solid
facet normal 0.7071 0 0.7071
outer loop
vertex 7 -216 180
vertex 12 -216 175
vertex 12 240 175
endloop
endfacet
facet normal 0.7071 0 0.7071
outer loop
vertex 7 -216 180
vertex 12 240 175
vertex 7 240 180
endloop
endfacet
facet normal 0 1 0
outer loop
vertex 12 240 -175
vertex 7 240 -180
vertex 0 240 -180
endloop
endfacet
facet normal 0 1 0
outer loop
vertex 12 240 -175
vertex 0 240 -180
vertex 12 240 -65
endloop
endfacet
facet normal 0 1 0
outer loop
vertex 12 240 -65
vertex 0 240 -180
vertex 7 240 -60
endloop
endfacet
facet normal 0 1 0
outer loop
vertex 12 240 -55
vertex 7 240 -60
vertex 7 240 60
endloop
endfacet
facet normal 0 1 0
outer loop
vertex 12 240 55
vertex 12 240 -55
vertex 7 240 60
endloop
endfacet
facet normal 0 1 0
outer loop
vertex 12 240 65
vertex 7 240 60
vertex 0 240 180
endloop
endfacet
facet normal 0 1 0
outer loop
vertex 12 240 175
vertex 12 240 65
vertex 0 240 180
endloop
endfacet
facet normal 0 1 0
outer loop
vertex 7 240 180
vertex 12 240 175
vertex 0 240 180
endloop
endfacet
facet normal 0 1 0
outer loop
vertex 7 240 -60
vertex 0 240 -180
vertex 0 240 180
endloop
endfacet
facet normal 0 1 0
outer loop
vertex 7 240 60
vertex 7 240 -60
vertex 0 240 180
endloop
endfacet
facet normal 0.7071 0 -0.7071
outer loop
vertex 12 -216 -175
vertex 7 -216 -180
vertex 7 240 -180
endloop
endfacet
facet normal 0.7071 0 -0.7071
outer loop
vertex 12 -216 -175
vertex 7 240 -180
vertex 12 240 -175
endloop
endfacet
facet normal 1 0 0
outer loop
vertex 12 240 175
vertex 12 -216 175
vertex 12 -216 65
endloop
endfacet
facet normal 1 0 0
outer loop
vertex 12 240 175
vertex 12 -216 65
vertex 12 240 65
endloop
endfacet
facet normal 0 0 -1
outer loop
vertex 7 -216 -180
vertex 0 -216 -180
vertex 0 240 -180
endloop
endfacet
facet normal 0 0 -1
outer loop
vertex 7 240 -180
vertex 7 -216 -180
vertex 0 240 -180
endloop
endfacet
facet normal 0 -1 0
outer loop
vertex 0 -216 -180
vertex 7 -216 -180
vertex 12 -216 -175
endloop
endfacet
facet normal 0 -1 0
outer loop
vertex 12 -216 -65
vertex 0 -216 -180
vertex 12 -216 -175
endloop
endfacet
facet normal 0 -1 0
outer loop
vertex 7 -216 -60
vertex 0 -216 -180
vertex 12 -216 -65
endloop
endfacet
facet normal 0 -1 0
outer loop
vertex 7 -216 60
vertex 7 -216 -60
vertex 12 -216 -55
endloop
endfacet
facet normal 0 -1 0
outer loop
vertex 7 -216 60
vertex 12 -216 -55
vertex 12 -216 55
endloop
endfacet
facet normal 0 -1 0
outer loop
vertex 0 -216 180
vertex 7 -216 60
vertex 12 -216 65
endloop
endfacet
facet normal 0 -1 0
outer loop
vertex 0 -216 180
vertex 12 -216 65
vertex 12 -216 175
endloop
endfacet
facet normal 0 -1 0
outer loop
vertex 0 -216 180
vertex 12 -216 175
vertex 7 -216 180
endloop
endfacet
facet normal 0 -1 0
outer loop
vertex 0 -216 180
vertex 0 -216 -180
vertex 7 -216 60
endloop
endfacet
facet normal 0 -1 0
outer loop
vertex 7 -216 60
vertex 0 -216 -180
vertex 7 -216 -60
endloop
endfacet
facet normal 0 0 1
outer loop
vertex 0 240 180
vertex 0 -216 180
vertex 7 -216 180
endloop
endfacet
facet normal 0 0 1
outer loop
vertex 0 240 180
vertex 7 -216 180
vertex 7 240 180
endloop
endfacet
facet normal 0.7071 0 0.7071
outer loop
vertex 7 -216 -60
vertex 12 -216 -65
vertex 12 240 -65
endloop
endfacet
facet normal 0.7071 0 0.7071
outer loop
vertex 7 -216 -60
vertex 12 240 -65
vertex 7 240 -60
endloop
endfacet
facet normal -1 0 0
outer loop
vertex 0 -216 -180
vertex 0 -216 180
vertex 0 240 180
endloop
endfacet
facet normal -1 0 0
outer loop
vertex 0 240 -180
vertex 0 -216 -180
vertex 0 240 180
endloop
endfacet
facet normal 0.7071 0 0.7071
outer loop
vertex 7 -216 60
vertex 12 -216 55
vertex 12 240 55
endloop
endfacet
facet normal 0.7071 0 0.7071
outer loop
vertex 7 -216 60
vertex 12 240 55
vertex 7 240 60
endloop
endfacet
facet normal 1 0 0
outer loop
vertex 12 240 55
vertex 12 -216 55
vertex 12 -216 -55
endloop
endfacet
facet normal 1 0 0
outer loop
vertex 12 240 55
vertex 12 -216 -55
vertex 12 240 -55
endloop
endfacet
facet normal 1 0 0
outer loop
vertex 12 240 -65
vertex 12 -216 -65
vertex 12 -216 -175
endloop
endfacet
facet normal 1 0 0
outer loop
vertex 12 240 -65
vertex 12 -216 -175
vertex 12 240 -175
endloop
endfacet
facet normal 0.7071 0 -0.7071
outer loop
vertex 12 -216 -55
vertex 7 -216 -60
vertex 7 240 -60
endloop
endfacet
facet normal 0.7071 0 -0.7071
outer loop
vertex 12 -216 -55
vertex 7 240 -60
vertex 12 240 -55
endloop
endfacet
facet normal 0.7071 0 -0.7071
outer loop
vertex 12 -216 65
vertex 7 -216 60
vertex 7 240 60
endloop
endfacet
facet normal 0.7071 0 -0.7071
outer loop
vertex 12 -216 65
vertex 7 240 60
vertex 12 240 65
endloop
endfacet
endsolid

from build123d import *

# Parameters (mm, degrees)
F0_W     = 480
F0_H     = 360
F1_DEPTH = 12
F3_DEPTH = 480.001
F4_DEPTH = 24


with BuildPart() as f1:
    # F0 (on Right) → F1 (new body)
    with BuildSketch(Plane.YZ):
        Rectangle(F0_W, F0_H)
    extrude(amount=F1_DEPTH)

    # F2 (on face) → F3 (cut, through all)
    with BuildSketch(Plane(origin=(0, 240, 0), x_dir=(-1, 0, 0), z_dir=(0, 1, 0))):
        Polygon((-12, -175), (-12, -180), (-7, -180), align=None)
        Polygon((-7, -60), (-12, -60), (-12, -65), align=None)
        Polygon((-12, -55), (-12, -60), (-7, -60), align=None)
        Polygon((-7, 60), (-12, 60), (-12, 55), align=None)
        Polygon((-12, 65), (-12, 60), (-7, 60), align=None)
        Polygon((-7, 180), (-12, 180), (-12, 175), align=None)
    extrude(amount=-F3_DEPTH, mode=Mode.SUBTRACT)

    # F4 (cut): a face of the model
    f4_faces = [f1.faces().sort_by_distance(p)[0] for p in [
        (5.9234393404, -240, 0),
    ]]
    extrude(f4_faces, amount=-F4_DEPTH, mode=Mode.SUBTRACT)


solid = f1.part
